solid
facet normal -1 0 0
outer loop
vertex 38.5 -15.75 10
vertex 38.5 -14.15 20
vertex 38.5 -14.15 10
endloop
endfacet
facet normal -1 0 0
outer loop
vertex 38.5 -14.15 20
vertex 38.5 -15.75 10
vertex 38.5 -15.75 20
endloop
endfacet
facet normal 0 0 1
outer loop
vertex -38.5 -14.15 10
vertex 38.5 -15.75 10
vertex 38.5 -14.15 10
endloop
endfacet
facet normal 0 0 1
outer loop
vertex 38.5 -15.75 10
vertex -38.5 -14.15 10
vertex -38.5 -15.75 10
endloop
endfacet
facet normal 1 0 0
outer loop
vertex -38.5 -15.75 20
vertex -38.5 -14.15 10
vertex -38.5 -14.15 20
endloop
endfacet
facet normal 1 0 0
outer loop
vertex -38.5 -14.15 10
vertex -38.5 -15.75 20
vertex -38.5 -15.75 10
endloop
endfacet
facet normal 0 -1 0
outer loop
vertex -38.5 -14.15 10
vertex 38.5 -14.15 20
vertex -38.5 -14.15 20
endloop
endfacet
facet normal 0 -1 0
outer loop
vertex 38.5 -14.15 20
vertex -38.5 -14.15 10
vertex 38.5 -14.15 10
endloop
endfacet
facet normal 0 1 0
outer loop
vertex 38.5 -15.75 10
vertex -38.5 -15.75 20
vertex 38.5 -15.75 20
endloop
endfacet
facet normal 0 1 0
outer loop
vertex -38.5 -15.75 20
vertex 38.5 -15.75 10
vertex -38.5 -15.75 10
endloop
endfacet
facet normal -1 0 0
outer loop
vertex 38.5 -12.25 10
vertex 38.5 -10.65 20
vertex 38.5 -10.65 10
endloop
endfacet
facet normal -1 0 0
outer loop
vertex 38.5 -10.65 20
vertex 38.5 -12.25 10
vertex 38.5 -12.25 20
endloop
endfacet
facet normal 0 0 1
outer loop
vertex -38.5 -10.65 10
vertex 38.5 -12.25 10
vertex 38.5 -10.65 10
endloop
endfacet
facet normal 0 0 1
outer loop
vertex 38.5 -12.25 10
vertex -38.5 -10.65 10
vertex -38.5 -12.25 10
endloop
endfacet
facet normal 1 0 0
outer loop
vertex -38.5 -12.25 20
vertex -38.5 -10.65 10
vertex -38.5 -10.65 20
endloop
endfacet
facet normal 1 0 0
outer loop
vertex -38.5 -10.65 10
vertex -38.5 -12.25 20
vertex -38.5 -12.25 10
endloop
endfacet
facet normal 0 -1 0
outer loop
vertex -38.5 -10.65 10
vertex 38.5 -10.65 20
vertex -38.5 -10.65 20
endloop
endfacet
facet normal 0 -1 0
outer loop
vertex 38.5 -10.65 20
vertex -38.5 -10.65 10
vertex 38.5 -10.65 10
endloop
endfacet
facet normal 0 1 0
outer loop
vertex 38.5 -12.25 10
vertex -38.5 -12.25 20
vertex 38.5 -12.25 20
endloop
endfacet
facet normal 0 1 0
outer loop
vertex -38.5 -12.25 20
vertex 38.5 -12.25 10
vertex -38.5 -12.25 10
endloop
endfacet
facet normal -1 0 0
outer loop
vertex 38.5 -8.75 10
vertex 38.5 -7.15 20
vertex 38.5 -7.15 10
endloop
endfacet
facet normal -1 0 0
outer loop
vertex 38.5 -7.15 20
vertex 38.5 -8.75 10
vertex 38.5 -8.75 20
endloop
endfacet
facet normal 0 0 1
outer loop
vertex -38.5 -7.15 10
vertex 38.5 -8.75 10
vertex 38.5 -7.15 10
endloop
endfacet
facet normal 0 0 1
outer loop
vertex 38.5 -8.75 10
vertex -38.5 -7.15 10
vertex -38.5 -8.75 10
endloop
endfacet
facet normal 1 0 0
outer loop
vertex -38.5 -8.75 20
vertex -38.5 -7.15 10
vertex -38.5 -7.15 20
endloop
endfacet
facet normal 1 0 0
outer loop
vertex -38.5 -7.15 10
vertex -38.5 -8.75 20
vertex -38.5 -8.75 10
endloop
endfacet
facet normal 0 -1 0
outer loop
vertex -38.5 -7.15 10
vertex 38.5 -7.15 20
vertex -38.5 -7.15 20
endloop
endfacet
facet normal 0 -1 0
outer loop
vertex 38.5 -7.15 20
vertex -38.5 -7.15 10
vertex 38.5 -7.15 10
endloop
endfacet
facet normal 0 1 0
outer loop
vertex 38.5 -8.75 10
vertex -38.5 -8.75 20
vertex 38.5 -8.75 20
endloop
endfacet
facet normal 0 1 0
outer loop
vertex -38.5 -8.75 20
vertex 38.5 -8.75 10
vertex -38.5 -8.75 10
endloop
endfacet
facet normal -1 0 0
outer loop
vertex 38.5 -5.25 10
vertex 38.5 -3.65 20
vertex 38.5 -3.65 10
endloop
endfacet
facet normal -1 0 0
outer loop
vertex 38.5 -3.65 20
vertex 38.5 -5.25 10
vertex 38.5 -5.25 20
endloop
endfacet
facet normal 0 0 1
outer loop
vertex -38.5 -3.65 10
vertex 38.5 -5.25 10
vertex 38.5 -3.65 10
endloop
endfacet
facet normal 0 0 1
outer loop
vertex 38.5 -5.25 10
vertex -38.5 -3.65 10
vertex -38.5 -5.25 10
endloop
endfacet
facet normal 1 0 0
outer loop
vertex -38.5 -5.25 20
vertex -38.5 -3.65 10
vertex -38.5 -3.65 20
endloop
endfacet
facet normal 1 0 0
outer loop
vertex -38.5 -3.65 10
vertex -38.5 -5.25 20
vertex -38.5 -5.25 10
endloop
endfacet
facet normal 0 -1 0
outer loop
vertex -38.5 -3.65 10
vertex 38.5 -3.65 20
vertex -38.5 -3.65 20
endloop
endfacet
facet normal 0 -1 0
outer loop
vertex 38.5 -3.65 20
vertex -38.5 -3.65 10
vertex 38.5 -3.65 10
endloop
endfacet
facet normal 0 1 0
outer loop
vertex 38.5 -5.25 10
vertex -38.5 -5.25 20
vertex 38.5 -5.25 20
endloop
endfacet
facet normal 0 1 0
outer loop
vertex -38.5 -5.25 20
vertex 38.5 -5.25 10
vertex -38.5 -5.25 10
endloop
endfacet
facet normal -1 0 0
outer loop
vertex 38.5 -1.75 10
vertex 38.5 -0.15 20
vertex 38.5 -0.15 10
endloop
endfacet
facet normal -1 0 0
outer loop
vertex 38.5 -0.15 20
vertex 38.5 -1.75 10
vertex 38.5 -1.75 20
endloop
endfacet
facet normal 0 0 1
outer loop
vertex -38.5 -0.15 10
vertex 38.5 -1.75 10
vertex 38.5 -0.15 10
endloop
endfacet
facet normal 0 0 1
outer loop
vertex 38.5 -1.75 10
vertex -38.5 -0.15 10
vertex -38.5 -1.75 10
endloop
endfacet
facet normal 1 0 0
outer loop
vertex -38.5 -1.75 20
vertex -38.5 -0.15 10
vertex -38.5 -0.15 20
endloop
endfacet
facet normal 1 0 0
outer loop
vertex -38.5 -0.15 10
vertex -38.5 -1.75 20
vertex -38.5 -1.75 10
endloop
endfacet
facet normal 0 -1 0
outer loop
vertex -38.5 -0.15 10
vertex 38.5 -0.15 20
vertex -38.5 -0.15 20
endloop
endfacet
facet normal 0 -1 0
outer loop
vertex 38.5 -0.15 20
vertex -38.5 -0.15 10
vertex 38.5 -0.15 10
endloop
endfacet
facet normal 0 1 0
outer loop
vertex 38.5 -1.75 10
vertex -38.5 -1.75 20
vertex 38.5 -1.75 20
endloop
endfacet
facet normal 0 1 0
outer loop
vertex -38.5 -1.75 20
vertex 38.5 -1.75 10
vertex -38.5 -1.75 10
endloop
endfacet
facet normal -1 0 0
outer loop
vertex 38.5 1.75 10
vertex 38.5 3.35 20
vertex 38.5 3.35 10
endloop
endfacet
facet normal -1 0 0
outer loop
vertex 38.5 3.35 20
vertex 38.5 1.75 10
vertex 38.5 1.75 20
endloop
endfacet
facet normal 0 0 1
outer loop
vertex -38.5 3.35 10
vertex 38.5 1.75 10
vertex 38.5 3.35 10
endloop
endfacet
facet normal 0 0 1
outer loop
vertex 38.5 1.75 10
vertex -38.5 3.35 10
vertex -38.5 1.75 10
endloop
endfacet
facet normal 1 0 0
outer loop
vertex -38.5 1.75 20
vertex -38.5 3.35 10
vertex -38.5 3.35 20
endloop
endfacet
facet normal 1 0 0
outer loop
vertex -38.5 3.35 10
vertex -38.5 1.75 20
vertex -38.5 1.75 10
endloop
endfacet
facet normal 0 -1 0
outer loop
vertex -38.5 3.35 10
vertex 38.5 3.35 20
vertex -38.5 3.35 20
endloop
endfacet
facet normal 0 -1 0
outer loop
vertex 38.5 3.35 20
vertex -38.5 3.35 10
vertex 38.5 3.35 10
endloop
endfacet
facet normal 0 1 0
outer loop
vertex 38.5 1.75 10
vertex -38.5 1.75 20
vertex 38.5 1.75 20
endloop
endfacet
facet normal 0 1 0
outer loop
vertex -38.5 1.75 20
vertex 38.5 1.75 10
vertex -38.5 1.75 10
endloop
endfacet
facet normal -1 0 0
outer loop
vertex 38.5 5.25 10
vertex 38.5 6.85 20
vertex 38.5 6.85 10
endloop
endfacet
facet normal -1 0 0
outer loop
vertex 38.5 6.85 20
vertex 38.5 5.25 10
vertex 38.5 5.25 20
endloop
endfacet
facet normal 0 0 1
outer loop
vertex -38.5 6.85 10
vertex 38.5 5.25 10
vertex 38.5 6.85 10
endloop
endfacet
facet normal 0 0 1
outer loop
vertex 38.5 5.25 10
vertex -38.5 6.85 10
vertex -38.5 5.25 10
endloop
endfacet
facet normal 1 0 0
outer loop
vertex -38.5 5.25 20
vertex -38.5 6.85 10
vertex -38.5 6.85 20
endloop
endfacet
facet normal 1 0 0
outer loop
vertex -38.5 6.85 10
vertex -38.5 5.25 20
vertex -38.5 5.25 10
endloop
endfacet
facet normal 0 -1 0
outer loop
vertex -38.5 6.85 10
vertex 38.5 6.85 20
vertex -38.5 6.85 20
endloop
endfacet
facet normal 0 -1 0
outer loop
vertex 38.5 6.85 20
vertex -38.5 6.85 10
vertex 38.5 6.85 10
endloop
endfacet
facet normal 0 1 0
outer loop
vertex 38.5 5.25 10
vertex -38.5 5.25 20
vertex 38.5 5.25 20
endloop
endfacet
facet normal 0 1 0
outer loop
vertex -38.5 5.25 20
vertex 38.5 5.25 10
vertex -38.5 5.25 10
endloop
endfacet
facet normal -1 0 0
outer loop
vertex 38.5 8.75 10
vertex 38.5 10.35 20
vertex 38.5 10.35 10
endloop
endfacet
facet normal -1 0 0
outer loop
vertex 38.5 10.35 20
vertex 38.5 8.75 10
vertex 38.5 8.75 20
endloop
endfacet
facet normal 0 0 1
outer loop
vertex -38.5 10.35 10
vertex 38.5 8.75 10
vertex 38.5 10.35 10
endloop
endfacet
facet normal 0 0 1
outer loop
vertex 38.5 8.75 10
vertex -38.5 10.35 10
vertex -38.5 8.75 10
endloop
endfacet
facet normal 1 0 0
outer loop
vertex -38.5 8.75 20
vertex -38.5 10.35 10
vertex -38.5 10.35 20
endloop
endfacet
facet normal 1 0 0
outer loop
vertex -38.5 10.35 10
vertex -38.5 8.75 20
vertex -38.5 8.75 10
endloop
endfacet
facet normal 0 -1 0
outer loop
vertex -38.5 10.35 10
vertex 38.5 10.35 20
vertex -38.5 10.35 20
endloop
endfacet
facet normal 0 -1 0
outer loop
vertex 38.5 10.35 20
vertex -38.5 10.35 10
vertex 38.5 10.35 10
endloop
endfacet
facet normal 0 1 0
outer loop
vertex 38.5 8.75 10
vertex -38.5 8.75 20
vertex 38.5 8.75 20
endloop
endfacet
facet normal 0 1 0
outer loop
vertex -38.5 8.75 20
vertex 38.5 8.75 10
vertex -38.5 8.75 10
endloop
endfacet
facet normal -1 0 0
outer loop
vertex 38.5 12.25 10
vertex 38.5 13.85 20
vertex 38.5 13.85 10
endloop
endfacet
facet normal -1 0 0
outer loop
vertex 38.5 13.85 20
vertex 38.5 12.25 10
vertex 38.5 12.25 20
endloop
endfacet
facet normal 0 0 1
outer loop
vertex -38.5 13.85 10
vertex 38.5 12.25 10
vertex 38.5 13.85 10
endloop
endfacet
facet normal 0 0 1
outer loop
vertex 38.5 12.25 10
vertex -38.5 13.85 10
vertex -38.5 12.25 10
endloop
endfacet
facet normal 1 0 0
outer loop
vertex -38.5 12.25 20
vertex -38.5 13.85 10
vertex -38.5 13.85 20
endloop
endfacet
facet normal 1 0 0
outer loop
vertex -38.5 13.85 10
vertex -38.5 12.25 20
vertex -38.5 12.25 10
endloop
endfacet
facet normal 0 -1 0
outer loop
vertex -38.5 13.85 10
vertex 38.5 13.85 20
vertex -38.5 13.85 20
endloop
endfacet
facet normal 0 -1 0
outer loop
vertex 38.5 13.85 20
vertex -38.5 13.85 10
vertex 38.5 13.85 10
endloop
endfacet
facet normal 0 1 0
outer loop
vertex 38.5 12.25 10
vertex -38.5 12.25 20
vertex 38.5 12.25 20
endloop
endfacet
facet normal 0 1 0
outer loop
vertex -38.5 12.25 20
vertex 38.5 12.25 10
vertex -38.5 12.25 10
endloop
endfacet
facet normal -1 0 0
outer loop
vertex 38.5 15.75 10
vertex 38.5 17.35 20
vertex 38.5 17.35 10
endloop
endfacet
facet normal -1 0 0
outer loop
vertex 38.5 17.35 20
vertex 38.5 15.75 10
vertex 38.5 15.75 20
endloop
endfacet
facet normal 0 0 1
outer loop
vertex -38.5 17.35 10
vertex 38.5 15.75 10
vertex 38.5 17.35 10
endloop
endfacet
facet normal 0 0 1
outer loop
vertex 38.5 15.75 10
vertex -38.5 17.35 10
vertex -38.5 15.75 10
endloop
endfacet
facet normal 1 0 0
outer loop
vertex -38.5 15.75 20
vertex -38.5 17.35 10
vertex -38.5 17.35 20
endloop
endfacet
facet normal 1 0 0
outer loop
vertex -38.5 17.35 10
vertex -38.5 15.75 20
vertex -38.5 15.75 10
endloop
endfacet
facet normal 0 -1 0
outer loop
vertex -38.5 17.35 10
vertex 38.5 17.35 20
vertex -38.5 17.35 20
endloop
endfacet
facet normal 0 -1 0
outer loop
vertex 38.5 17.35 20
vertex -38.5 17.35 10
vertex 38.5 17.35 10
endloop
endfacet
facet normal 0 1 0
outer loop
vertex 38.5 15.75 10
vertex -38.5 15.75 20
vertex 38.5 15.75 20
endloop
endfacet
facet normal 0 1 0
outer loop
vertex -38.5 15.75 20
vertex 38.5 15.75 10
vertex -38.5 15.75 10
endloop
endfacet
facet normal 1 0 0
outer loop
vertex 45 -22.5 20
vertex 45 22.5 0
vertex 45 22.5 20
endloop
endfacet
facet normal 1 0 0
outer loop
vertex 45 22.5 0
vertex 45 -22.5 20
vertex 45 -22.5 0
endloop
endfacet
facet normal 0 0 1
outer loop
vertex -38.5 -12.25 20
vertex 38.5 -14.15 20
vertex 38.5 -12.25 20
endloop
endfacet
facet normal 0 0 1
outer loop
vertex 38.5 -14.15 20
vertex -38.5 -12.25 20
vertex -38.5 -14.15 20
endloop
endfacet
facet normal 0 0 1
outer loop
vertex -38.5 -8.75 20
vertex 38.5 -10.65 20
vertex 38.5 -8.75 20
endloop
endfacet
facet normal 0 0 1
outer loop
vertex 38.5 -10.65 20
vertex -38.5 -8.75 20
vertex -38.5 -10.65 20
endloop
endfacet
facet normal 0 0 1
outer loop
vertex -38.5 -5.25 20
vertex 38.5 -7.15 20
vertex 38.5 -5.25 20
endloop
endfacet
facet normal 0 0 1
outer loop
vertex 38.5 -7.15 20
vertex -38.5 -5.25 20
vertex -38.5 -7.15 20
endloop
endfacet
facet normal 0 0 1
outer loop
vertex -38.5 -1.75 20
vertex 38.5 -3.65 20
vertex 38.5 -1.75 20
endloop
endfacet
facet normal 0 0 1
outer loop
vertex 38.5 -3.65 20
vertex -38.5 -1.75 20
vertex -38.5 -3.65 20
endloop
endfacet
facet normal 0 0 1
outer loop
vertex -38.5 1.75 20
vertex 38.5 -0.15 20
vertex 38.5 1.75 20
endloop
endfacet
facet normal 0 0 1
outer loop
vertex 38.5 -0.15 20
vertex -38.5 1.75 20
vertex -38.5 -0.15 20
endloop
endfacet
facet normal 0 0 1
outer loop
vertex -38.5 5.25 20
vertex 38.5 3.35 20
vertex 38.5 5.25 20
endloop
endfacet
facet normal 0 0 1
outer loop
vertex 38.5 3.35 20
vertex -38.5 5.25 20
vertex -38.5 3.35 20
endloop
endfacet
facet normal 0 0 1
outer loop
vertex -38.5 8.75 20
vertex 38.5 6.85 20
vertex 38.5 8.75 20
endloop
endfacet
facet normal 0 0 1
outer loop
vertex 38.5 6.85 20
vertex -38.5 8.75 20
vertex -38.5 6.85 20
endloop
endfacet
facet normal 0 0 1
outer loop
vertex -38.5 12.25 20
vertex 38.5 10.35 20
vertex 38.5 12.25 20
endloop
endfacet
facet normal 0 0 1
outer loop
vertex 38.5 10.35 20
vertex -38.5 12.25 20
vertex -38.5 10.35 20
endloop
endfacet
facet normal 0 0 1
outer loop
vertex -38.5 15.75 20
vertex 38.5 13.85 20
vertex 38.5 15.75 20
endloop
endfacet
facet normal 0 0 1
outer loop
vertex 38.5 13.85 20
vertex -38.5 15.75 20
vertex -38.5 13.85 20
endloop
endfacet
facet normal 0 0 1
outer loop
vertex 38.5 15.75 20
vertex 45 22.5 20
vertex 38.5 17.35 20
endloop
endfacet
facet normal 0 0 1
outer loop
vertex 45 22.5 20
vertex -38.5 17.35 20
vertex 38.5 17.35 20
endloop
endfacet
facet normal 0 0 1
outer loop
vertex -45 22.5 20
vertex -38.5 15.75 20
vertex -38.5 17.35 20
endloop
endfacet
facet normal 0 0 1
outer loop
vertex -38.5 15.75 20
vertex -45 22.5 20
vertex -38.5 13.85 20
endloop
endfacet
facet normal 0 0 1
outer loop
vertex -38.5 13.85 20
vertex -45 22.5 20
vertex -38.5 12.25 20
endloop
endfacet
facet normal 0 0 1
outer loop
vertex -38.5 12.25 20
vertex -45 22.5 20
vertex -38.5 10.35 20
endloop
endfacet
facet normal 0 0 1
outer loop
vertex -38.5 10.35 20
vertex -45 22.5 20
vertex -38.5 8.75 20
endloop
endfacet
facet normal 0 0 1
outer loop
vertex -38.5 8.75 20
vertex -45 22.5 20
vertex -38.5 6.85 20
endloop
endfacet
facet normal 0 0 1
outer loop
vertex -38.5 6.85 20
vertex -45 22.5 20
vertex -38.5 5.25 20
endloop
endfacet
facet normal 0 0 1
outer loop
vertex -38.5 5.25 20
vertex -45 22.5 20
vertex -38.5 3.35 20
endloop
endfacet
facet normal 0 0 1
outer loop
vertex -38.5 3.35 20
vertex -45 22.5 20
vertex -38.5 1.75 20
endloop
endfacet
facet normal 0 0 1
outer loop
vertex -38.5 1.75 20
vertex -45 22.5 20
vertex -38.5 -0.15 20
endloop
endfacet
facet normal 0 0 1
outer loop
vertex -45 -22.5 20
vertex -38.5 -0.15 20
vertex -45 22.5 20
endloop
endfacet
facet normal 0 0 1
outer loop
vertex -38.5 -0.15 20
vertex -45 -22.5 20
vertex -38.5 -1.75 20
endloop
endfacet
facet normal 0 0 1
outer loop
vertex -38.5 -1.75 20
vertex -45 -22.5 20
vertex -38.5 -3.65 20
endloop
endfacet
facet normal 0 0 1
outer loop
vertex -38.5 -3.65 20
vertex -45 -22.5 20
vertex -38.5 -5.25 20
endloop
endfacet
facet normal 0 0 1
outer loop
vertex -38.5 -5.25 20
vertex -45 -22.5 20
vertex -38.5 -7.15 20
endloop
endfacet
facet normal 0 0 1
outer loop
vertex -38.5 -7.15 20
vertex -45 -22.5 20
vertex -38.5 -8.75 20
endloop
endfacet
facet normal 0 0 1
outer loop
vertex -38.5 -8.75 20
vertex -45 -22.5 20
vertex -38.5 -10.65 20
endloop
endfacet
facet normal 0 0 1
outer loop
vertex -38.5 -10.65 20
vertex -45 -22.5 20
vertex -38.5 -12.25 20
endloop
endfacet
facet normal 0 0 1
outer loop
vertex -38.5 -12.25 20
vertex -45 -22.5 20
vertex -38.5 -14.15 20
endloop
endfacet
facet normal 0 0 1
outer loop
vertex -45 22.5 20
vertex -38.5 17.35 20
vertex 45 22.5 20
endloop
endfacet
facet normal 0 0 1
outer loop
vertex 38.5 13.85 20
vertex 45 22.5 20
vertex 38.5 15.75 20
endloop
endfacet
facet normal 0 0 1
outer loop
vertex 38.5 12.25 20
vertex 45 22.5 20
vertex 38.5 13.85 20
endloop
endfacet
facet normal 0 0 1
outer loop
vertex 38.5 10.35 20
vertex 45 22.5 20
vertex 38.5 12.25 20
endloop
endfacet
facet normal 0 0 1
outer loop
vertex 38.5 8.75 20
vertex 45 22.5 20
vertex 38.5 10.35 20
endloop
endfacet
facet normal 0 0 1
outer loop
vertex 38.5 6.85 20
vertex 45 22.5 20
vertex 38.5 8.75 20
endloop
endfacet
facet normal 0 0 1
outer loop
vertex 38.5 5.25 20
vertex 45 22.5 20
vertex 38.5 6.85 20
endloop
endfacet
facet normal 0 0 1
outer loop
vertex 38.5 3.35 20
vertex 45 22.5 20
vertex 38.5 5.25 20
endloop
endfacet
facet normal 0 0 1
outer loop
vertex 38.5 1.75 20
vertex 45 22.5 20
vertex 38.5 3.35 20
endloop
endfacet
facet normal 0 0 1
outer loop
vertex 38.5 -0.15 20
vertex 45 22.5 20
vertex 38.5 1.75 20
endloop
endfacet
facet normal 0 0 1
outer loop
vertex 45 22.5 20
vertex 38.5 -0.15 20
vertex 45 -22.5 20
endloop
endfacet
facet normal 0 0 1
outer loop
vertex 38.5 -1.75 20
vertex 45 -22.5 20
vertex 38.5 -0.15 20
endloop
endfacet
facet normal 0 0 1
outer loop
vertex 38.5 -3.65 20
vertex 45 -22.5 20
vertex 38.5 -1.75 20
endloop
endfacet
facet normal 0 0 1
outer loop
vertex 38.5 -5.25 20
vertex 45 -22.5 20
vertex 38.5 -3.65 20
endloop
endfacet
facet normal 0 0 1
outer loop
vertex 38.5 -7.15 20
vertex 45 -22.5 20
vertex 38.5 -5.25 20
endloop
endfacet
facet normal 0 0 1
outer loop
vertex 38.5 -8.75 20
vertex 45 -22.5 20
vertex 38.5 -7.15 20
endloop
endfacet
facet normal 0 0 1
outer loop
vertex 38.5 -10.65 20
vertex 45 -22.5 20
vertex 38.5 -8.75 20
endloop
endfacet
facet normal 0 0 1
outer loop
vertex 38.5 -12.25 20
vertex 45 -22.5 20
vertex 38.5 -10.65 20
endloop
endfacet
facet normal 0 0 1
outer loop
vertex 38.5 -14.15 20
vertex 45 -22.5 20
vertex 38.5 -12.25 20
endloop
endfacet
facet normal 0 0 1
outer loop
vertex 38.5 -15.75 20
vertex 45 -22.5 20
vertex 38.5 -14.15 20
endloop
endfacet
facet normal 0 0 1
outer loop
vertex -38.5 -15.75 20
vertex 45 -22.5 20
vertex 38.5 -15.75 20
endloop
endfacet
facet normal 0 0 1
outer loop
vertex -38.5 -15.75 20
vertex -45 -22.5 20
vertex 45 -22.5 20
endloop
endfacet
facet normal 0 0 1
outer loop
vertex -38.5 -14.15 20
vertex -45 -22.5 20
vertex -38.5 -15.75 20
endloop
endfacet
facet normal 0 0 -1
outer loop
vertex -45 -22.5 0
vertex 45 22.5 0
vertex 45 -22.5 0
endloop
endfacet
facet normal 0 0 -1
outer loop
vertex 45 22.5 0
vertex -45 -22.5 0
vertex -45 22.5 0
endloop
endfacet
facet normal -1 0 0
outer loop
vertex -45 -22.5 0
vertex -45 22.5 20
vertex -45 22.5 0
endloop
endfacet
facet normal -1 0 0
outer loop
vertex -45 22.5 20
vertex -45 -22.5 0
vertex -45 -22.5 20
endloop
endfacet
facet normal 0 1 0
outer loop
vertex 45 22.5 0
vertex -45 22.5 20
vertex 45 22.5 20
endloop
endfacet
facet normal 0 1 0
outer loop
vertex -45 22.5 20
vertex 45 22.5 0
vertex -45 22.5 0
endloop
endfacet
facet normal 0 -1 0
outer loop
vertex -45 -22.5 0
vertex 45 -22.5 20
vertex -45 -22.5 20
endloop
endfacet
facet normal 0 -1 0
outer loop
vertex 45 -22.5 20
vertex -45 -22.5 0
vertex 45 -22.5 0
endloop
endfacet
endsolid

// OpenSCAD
// Microscope slide drying rack
// Units: mm. Print orientation: base on XY plane, slots open upward (+Z).

// ---------- Parameters ----------
base_len      = 90;    // base block length (X)
base_wid      = 45;    // base block width (Y)
base_ht       = 20;    // base block height (Z)

slot_count    = 10;    // number of slide slots
slot_len      = 77;    // slot length along X
slot_w        = 1.6;   // slot width along Y
slot_depth    = 10;    // slot depth into block (from top face)
slot_pitch    = 3.5;   // centre-to-centre slot spacing along Y

eps           = 0.5;   // cutter overshoot past top face

$fn = 64;

// ---------- Model ----------
difference() {
    // Solid base block, centred in X and Y, resting on z = 0
    translate([-base_len/2, -base_wid/2, 0])
        cube([base_len, base_wid, base_ht]);

    // Parallel slots open at the top, centred on the block in X and Y
    for (i = [0 : slot_count - 1]) {
        y_c = (i - (slot_count - 1)/2) * slot_pitch;
        translate([-slot_len/2, y_c, base_ht - slot_depth])
            cube([slot_len, slot_w, slot_depth + eps]);
    }
}
